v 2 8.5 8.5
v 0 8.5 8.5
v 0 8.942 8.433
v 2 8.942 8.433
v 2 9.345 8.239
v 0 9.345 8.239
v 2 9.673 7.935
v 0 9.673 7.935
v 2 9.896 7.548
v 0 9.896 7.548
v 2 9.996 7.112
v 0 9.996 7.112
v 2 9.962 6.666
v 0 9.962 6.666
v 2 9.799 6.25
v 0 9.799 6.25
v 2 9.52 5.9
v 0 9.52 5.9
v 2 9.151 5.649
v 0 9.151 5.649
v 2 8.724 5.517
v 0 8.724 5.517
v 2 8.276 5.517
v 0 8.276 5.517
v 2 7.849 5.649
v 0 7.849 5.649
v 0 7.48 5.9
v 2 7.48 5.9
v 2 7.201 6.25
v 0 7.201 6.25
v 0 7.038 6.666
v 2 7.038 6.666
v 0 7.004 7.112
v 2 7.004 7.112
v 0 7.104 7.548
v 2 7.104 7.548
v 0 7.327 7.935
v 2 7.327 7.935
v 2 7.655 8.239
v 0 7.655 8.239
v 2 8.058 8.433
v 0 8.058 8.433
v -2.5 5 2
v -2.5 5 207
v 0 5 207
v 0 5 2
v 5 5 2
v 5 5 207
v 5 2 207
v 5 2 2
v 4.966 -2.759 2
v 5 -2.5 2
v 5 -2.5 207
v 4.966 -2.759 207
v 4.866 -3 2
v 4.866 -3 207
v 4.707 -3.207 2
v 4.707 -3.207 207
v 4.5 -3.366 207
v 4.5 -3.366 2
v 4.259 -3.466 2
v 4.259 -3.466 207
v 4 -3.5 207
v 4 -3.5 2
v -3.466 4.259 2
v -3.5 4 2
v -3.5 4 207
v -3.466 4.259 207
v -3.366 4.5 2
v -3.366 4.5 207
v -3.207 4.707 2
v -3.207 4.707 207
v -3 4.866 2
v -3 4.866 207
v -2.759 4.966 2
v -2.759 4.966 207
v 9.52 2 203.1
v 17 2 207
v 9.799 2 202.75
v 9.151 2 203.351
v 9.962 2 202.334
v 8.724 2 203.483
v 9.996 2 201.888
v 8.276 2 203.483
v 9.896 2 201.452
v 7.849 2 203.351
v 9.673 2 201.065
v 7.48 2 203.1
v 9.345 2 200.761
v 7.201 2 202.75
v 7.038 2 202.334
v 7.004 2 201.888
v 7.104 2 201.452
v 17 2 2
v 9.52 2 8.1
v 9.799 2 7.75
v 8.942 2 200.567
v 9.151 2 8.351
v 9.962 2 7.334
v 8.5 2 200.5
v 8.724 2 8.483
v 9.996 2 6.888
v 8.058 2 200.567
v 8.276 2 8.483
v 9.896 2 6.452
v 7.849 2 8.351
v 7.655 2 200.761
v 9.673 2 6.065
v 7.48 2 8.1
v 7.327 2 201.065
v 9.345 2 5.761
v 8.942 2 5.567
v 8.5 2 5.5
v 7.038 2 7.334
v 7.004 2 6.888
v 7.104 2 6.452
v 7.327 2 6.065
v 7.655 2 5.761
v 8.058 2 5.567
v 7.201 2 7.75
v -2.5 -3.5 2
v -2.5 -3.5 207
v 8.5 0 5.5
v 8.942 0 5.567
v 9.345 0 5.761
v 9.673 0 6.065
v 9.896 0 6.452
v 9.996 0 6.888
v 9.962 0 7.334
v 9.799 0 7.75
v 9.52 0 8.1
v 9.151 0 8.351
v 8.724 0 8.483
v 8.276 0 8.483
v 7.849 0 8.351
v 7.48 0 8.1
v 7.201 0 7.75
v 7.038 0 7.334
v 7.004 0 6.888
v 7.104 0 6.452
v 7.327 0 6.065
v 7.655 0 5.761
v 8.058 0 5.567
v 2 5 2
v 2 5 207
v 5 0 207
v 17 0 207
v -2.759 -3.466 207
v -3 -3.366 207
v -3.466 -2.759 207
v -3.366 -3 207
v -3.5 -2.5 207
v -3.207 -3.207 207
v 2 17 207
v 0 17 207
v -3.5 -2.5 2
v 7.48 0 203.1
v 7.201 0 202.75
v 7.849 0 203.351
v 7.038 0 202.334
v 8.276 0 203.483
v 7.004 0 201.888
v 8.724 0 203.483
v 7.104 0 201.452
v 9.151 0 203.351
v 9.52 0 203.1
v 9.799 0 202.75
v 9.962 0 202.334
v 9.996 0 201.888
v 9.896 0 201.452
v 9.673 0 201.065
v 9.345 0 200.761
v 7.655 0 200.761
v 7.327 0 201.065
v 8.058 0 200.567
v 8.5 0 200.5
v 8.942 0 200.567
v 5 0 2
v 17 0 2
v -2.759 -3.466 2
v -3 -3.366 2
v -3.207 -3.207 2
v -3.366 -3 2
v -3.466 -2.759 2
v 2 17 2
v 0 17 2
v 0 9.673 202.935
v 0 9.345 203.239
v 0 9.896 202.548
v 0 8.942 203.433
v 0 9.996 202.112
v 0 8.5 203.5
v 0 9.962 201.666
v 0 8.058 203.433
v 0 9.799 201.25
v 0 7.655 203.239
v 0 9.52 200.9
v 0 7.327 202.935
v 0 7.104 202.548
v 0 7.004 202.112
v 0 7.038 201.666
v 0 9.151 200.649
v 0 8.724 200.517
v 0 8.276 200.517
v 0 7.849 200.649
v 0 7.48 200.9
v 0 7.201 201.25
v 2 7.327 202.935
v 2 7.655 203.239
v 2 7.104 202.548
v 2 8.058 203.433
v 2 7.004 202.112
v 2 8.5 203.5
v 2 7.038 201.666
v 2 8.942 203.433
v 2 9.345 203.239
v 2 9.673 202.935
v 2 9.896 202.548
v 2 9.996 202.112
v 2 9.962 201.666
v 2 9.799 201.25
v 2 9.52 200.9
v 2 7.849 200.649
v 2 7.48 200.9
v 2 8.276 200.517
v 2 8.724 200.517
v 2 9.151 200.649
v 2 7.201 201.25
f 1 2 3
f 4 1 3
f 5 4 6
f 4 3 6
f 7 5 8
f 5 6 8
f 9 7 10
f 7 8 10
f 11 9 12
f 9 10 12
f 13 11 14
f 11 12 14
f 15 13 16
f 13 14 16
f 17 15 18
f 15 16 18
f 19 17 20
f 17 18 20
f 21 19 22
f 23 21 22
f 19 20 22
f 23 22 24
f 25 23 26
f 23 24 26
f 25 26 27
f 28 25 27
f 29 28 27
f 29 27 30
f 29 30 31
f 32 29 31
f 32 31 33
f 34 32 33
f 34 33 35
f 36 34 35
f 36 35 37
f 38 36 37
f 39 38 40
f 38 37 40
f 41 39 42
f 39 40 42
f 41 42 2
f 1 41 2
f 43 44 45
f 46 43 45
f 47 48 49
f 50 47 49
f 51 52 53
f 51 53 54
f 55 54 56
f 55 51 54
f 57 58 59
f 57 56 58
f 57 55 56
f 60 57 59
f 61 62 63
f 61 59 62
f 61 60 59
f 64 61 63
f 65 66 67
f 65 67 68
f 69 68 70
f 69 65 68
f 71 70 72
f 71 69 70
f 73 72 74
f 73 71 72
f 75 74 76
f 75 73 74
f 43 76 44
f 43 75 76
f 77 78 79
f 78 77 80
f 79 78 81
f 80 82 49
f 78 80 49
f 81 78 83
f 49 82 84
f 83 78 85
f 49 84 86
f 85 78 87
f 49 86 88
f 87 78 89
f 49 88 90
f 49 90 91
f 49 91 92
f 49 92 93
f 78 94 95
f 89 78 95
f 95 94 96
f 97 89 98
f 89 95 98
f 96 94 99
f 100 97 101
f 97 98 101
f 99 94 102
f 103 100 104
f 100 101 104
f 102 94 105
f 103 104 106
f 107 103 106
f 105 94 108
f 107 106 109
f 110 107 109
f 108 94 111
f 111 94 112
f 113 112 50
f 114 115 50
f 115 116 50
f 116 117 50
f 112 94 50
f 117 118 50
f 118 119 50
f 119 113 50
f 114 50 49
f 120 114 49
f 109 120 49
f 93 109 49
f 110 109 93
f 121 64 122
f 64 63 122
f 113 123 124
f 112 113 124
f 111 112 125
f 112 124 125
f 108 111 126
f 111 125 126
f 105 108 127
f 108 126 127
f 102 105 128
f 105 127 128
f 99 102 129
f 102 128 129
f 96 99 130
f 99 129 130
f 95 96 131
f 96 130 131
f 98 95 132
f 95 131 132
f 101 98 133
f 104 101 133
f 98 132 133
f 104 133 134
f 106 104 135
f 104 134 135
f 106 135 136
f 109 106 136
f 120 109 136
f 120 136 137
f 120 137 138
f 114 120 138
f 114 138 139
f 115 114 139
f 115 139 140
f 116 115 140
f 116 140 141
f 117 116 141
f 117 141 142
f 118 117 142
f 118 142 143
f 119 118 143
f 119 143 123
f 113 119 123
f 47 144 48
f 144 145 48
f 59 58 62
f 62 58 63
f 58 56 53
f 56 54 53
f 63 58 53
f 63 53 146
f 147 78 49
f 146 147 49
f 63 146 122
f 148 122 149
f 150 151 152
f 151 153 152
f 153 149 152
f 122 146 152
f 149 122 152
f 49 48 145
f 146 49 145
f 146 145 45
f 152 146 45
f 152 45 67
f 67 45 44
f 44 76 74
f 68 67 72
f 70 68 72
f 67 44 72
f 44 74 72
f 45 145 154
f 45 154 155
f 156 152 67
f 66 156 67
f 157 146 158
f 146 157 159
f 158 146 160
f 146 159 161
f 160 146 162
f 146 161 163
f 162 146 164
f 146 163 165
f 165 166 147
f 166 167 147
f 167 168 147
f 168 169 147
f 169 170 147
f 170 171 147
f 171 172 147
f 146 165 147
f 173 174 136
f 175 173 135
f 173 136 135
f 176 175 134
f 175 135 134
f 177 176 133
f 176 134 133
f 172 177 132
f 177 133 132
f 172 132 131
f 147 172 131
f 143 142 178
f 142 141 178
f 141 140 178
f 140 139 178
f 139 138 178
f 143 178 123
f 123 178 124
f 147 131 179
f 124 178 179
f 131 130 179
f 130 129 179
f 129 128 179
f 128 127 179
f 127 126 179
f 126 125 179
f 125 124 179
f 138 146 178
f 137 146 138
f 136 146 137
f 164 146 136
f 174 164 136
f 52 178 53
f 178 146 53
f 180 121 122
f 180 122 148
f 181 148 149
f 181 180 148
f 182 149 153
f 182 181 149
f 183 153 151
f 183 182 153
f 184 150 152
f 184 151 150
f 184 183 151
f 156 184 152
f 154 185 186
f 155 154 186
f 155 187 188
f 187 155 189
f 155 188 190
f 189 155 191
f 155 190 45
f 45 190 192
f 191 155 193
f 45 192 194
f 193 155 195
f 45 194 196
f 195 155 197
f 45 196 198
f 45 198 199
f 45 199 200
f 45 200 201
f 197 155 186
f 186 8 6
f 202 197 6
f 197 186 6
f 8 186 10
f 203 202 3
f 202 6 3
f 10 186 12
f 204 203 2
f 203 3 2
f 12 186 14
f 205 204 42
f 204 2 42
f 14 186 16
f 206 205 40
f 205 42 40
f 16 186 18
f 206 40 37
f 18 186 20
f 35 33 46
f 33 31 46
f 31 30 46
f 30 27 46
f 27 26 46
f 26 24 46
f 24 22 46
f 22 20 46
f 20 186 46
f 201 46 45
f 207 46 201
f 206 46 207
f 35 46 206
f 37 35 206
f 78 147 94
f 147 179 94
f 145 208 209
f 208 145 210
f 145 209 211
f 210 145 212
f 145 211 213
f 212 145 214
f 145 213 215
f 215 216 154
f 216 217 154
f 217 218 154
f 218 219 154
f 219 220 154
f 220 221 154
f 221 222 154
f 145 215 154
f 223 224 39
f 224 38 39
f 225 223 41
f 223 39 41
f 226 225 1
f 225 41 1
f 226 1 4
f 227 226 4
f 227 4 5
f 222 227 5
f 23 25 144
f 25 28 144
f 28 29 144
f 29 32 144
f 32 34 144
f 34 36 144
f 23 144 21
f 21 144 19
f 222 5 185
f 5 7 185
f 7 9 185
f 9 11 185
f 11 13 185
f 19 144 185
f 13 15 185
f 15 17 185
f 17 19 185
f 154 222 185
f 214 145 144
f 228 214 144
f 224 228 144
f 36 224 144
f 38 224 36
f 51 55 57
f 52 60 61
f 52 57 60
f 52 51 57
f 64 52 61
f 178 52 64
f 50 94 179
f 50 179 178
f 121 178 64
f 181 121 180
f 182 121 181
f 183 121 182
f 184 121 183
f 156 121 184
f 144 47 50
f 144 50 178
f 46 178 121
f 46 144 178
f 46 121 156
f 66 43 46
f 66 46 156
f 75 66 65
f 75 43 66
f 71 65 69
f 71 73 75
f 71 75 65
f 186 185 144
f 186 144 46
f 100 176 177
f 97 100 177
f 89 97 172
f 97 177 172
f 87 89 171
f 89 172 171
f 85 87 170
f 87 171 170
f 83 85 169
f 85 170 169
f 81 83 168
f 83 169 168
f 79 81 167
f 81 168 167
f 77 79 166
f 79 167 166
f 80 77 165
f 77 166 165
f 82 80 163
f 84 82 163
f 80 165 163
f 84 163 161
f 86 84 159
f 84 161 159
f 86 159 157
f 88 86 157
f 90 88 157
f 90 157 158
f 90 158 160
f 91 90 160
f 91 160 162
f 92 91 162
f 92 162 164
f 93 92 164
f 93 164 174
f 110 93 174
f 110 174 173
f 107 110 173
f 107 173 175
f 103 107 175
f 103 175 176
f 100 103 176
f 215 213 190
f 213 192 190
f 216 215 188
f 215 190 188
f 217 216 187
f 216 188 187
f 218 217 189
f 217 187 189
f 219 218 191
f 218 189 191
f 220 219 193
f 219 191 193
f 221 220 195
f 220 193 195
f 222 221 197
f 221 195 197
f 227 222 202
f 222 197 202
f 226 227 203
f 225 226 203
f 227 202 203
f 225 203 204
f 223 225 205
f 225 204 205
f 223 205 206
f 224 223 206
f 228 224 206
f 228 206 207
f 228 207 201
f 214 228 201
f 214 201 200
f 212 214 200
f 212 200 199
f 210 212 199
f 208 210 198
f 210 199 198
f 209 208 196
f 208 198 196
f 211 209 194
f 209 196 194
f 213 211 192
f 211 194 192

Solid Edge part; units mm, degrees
sketch "Sketch1" plane through (0, 0, 0) normal (0, 0, 1) x (1, 0, 0)
  line L0 (0, 0) -> (17, 0)
  line L1 (17, 0) -> (17, 2)
  line L2 (17, 2) -> (2, 2)
  line L3 (2, 2) -> (2, 17)
  line L4 (2, 17) -> (0, 17)
  line L5 (0, 17) -> (0, 0)
extrude "Protrusion1" add sketch "Sketch1" along normal blind 207
sketch "Sketch2" plane through (8.5, 8.5, 207) normal (0, 0, 1) x (1, 0, 0)
  line L0 (-12, -3.5) -> (-3.5, -3.5)
  line L1 (-3.5, -3.5) -> (-3.5, -12)
  line L2 (-3.5, -12) -> (-12, -12)
  line L3 (-12, -12) -> (-12, -3.5)
  dimension "D1" = 8.5
  dimension "D2" = 8.5
  dimension "D3" = 8.5
  dimension "D4" = 3.5
  dimension "D5" = 3.5
extrude "ExtrudedProtrusion_2" add sketch "Sketch2" against normal blind 207
sketch "Sketch3" plane through (6.75, 6.75, 0) normal (0, 0, -1) x (0, -1, 0)
  line L0 (-11.0586, -10.6054) -> (14.5586, -10.6054)
  line L1 (14.5586, -10.6054) -> (14.5586, 14.1054)
  line L2 (14.5586, 14.1054) -> (-11.0586, 14.1054)
  line L3 (-11.0586, 14.1054) -> (-11.0586, -10.6054)
extrude "ExtrudedCutout_1" cut sketch "Sketch3" against normal blind 2
hole "Hole1" at (8.5, 0, 202) direction (0, 1, 0) diameter 3 end through all
hole "Hole_2" at (8.5, 0, 7) direction (0, 1, 0) diameter 3 end up to next
hole "Hole_3" at (0, 8.5, 202) direction (1, 0, 0) diameter 3 end through all
hole "Hole_4" at (0, 8.5, 7) direction (1, 0, 0) diameter 3 end through all
fillet "Round_1" radius 1 3 edges at (-3.5, -3.5, 104.5) (-3.5, 5, 104.5) (5, -3.5, 104.5)
